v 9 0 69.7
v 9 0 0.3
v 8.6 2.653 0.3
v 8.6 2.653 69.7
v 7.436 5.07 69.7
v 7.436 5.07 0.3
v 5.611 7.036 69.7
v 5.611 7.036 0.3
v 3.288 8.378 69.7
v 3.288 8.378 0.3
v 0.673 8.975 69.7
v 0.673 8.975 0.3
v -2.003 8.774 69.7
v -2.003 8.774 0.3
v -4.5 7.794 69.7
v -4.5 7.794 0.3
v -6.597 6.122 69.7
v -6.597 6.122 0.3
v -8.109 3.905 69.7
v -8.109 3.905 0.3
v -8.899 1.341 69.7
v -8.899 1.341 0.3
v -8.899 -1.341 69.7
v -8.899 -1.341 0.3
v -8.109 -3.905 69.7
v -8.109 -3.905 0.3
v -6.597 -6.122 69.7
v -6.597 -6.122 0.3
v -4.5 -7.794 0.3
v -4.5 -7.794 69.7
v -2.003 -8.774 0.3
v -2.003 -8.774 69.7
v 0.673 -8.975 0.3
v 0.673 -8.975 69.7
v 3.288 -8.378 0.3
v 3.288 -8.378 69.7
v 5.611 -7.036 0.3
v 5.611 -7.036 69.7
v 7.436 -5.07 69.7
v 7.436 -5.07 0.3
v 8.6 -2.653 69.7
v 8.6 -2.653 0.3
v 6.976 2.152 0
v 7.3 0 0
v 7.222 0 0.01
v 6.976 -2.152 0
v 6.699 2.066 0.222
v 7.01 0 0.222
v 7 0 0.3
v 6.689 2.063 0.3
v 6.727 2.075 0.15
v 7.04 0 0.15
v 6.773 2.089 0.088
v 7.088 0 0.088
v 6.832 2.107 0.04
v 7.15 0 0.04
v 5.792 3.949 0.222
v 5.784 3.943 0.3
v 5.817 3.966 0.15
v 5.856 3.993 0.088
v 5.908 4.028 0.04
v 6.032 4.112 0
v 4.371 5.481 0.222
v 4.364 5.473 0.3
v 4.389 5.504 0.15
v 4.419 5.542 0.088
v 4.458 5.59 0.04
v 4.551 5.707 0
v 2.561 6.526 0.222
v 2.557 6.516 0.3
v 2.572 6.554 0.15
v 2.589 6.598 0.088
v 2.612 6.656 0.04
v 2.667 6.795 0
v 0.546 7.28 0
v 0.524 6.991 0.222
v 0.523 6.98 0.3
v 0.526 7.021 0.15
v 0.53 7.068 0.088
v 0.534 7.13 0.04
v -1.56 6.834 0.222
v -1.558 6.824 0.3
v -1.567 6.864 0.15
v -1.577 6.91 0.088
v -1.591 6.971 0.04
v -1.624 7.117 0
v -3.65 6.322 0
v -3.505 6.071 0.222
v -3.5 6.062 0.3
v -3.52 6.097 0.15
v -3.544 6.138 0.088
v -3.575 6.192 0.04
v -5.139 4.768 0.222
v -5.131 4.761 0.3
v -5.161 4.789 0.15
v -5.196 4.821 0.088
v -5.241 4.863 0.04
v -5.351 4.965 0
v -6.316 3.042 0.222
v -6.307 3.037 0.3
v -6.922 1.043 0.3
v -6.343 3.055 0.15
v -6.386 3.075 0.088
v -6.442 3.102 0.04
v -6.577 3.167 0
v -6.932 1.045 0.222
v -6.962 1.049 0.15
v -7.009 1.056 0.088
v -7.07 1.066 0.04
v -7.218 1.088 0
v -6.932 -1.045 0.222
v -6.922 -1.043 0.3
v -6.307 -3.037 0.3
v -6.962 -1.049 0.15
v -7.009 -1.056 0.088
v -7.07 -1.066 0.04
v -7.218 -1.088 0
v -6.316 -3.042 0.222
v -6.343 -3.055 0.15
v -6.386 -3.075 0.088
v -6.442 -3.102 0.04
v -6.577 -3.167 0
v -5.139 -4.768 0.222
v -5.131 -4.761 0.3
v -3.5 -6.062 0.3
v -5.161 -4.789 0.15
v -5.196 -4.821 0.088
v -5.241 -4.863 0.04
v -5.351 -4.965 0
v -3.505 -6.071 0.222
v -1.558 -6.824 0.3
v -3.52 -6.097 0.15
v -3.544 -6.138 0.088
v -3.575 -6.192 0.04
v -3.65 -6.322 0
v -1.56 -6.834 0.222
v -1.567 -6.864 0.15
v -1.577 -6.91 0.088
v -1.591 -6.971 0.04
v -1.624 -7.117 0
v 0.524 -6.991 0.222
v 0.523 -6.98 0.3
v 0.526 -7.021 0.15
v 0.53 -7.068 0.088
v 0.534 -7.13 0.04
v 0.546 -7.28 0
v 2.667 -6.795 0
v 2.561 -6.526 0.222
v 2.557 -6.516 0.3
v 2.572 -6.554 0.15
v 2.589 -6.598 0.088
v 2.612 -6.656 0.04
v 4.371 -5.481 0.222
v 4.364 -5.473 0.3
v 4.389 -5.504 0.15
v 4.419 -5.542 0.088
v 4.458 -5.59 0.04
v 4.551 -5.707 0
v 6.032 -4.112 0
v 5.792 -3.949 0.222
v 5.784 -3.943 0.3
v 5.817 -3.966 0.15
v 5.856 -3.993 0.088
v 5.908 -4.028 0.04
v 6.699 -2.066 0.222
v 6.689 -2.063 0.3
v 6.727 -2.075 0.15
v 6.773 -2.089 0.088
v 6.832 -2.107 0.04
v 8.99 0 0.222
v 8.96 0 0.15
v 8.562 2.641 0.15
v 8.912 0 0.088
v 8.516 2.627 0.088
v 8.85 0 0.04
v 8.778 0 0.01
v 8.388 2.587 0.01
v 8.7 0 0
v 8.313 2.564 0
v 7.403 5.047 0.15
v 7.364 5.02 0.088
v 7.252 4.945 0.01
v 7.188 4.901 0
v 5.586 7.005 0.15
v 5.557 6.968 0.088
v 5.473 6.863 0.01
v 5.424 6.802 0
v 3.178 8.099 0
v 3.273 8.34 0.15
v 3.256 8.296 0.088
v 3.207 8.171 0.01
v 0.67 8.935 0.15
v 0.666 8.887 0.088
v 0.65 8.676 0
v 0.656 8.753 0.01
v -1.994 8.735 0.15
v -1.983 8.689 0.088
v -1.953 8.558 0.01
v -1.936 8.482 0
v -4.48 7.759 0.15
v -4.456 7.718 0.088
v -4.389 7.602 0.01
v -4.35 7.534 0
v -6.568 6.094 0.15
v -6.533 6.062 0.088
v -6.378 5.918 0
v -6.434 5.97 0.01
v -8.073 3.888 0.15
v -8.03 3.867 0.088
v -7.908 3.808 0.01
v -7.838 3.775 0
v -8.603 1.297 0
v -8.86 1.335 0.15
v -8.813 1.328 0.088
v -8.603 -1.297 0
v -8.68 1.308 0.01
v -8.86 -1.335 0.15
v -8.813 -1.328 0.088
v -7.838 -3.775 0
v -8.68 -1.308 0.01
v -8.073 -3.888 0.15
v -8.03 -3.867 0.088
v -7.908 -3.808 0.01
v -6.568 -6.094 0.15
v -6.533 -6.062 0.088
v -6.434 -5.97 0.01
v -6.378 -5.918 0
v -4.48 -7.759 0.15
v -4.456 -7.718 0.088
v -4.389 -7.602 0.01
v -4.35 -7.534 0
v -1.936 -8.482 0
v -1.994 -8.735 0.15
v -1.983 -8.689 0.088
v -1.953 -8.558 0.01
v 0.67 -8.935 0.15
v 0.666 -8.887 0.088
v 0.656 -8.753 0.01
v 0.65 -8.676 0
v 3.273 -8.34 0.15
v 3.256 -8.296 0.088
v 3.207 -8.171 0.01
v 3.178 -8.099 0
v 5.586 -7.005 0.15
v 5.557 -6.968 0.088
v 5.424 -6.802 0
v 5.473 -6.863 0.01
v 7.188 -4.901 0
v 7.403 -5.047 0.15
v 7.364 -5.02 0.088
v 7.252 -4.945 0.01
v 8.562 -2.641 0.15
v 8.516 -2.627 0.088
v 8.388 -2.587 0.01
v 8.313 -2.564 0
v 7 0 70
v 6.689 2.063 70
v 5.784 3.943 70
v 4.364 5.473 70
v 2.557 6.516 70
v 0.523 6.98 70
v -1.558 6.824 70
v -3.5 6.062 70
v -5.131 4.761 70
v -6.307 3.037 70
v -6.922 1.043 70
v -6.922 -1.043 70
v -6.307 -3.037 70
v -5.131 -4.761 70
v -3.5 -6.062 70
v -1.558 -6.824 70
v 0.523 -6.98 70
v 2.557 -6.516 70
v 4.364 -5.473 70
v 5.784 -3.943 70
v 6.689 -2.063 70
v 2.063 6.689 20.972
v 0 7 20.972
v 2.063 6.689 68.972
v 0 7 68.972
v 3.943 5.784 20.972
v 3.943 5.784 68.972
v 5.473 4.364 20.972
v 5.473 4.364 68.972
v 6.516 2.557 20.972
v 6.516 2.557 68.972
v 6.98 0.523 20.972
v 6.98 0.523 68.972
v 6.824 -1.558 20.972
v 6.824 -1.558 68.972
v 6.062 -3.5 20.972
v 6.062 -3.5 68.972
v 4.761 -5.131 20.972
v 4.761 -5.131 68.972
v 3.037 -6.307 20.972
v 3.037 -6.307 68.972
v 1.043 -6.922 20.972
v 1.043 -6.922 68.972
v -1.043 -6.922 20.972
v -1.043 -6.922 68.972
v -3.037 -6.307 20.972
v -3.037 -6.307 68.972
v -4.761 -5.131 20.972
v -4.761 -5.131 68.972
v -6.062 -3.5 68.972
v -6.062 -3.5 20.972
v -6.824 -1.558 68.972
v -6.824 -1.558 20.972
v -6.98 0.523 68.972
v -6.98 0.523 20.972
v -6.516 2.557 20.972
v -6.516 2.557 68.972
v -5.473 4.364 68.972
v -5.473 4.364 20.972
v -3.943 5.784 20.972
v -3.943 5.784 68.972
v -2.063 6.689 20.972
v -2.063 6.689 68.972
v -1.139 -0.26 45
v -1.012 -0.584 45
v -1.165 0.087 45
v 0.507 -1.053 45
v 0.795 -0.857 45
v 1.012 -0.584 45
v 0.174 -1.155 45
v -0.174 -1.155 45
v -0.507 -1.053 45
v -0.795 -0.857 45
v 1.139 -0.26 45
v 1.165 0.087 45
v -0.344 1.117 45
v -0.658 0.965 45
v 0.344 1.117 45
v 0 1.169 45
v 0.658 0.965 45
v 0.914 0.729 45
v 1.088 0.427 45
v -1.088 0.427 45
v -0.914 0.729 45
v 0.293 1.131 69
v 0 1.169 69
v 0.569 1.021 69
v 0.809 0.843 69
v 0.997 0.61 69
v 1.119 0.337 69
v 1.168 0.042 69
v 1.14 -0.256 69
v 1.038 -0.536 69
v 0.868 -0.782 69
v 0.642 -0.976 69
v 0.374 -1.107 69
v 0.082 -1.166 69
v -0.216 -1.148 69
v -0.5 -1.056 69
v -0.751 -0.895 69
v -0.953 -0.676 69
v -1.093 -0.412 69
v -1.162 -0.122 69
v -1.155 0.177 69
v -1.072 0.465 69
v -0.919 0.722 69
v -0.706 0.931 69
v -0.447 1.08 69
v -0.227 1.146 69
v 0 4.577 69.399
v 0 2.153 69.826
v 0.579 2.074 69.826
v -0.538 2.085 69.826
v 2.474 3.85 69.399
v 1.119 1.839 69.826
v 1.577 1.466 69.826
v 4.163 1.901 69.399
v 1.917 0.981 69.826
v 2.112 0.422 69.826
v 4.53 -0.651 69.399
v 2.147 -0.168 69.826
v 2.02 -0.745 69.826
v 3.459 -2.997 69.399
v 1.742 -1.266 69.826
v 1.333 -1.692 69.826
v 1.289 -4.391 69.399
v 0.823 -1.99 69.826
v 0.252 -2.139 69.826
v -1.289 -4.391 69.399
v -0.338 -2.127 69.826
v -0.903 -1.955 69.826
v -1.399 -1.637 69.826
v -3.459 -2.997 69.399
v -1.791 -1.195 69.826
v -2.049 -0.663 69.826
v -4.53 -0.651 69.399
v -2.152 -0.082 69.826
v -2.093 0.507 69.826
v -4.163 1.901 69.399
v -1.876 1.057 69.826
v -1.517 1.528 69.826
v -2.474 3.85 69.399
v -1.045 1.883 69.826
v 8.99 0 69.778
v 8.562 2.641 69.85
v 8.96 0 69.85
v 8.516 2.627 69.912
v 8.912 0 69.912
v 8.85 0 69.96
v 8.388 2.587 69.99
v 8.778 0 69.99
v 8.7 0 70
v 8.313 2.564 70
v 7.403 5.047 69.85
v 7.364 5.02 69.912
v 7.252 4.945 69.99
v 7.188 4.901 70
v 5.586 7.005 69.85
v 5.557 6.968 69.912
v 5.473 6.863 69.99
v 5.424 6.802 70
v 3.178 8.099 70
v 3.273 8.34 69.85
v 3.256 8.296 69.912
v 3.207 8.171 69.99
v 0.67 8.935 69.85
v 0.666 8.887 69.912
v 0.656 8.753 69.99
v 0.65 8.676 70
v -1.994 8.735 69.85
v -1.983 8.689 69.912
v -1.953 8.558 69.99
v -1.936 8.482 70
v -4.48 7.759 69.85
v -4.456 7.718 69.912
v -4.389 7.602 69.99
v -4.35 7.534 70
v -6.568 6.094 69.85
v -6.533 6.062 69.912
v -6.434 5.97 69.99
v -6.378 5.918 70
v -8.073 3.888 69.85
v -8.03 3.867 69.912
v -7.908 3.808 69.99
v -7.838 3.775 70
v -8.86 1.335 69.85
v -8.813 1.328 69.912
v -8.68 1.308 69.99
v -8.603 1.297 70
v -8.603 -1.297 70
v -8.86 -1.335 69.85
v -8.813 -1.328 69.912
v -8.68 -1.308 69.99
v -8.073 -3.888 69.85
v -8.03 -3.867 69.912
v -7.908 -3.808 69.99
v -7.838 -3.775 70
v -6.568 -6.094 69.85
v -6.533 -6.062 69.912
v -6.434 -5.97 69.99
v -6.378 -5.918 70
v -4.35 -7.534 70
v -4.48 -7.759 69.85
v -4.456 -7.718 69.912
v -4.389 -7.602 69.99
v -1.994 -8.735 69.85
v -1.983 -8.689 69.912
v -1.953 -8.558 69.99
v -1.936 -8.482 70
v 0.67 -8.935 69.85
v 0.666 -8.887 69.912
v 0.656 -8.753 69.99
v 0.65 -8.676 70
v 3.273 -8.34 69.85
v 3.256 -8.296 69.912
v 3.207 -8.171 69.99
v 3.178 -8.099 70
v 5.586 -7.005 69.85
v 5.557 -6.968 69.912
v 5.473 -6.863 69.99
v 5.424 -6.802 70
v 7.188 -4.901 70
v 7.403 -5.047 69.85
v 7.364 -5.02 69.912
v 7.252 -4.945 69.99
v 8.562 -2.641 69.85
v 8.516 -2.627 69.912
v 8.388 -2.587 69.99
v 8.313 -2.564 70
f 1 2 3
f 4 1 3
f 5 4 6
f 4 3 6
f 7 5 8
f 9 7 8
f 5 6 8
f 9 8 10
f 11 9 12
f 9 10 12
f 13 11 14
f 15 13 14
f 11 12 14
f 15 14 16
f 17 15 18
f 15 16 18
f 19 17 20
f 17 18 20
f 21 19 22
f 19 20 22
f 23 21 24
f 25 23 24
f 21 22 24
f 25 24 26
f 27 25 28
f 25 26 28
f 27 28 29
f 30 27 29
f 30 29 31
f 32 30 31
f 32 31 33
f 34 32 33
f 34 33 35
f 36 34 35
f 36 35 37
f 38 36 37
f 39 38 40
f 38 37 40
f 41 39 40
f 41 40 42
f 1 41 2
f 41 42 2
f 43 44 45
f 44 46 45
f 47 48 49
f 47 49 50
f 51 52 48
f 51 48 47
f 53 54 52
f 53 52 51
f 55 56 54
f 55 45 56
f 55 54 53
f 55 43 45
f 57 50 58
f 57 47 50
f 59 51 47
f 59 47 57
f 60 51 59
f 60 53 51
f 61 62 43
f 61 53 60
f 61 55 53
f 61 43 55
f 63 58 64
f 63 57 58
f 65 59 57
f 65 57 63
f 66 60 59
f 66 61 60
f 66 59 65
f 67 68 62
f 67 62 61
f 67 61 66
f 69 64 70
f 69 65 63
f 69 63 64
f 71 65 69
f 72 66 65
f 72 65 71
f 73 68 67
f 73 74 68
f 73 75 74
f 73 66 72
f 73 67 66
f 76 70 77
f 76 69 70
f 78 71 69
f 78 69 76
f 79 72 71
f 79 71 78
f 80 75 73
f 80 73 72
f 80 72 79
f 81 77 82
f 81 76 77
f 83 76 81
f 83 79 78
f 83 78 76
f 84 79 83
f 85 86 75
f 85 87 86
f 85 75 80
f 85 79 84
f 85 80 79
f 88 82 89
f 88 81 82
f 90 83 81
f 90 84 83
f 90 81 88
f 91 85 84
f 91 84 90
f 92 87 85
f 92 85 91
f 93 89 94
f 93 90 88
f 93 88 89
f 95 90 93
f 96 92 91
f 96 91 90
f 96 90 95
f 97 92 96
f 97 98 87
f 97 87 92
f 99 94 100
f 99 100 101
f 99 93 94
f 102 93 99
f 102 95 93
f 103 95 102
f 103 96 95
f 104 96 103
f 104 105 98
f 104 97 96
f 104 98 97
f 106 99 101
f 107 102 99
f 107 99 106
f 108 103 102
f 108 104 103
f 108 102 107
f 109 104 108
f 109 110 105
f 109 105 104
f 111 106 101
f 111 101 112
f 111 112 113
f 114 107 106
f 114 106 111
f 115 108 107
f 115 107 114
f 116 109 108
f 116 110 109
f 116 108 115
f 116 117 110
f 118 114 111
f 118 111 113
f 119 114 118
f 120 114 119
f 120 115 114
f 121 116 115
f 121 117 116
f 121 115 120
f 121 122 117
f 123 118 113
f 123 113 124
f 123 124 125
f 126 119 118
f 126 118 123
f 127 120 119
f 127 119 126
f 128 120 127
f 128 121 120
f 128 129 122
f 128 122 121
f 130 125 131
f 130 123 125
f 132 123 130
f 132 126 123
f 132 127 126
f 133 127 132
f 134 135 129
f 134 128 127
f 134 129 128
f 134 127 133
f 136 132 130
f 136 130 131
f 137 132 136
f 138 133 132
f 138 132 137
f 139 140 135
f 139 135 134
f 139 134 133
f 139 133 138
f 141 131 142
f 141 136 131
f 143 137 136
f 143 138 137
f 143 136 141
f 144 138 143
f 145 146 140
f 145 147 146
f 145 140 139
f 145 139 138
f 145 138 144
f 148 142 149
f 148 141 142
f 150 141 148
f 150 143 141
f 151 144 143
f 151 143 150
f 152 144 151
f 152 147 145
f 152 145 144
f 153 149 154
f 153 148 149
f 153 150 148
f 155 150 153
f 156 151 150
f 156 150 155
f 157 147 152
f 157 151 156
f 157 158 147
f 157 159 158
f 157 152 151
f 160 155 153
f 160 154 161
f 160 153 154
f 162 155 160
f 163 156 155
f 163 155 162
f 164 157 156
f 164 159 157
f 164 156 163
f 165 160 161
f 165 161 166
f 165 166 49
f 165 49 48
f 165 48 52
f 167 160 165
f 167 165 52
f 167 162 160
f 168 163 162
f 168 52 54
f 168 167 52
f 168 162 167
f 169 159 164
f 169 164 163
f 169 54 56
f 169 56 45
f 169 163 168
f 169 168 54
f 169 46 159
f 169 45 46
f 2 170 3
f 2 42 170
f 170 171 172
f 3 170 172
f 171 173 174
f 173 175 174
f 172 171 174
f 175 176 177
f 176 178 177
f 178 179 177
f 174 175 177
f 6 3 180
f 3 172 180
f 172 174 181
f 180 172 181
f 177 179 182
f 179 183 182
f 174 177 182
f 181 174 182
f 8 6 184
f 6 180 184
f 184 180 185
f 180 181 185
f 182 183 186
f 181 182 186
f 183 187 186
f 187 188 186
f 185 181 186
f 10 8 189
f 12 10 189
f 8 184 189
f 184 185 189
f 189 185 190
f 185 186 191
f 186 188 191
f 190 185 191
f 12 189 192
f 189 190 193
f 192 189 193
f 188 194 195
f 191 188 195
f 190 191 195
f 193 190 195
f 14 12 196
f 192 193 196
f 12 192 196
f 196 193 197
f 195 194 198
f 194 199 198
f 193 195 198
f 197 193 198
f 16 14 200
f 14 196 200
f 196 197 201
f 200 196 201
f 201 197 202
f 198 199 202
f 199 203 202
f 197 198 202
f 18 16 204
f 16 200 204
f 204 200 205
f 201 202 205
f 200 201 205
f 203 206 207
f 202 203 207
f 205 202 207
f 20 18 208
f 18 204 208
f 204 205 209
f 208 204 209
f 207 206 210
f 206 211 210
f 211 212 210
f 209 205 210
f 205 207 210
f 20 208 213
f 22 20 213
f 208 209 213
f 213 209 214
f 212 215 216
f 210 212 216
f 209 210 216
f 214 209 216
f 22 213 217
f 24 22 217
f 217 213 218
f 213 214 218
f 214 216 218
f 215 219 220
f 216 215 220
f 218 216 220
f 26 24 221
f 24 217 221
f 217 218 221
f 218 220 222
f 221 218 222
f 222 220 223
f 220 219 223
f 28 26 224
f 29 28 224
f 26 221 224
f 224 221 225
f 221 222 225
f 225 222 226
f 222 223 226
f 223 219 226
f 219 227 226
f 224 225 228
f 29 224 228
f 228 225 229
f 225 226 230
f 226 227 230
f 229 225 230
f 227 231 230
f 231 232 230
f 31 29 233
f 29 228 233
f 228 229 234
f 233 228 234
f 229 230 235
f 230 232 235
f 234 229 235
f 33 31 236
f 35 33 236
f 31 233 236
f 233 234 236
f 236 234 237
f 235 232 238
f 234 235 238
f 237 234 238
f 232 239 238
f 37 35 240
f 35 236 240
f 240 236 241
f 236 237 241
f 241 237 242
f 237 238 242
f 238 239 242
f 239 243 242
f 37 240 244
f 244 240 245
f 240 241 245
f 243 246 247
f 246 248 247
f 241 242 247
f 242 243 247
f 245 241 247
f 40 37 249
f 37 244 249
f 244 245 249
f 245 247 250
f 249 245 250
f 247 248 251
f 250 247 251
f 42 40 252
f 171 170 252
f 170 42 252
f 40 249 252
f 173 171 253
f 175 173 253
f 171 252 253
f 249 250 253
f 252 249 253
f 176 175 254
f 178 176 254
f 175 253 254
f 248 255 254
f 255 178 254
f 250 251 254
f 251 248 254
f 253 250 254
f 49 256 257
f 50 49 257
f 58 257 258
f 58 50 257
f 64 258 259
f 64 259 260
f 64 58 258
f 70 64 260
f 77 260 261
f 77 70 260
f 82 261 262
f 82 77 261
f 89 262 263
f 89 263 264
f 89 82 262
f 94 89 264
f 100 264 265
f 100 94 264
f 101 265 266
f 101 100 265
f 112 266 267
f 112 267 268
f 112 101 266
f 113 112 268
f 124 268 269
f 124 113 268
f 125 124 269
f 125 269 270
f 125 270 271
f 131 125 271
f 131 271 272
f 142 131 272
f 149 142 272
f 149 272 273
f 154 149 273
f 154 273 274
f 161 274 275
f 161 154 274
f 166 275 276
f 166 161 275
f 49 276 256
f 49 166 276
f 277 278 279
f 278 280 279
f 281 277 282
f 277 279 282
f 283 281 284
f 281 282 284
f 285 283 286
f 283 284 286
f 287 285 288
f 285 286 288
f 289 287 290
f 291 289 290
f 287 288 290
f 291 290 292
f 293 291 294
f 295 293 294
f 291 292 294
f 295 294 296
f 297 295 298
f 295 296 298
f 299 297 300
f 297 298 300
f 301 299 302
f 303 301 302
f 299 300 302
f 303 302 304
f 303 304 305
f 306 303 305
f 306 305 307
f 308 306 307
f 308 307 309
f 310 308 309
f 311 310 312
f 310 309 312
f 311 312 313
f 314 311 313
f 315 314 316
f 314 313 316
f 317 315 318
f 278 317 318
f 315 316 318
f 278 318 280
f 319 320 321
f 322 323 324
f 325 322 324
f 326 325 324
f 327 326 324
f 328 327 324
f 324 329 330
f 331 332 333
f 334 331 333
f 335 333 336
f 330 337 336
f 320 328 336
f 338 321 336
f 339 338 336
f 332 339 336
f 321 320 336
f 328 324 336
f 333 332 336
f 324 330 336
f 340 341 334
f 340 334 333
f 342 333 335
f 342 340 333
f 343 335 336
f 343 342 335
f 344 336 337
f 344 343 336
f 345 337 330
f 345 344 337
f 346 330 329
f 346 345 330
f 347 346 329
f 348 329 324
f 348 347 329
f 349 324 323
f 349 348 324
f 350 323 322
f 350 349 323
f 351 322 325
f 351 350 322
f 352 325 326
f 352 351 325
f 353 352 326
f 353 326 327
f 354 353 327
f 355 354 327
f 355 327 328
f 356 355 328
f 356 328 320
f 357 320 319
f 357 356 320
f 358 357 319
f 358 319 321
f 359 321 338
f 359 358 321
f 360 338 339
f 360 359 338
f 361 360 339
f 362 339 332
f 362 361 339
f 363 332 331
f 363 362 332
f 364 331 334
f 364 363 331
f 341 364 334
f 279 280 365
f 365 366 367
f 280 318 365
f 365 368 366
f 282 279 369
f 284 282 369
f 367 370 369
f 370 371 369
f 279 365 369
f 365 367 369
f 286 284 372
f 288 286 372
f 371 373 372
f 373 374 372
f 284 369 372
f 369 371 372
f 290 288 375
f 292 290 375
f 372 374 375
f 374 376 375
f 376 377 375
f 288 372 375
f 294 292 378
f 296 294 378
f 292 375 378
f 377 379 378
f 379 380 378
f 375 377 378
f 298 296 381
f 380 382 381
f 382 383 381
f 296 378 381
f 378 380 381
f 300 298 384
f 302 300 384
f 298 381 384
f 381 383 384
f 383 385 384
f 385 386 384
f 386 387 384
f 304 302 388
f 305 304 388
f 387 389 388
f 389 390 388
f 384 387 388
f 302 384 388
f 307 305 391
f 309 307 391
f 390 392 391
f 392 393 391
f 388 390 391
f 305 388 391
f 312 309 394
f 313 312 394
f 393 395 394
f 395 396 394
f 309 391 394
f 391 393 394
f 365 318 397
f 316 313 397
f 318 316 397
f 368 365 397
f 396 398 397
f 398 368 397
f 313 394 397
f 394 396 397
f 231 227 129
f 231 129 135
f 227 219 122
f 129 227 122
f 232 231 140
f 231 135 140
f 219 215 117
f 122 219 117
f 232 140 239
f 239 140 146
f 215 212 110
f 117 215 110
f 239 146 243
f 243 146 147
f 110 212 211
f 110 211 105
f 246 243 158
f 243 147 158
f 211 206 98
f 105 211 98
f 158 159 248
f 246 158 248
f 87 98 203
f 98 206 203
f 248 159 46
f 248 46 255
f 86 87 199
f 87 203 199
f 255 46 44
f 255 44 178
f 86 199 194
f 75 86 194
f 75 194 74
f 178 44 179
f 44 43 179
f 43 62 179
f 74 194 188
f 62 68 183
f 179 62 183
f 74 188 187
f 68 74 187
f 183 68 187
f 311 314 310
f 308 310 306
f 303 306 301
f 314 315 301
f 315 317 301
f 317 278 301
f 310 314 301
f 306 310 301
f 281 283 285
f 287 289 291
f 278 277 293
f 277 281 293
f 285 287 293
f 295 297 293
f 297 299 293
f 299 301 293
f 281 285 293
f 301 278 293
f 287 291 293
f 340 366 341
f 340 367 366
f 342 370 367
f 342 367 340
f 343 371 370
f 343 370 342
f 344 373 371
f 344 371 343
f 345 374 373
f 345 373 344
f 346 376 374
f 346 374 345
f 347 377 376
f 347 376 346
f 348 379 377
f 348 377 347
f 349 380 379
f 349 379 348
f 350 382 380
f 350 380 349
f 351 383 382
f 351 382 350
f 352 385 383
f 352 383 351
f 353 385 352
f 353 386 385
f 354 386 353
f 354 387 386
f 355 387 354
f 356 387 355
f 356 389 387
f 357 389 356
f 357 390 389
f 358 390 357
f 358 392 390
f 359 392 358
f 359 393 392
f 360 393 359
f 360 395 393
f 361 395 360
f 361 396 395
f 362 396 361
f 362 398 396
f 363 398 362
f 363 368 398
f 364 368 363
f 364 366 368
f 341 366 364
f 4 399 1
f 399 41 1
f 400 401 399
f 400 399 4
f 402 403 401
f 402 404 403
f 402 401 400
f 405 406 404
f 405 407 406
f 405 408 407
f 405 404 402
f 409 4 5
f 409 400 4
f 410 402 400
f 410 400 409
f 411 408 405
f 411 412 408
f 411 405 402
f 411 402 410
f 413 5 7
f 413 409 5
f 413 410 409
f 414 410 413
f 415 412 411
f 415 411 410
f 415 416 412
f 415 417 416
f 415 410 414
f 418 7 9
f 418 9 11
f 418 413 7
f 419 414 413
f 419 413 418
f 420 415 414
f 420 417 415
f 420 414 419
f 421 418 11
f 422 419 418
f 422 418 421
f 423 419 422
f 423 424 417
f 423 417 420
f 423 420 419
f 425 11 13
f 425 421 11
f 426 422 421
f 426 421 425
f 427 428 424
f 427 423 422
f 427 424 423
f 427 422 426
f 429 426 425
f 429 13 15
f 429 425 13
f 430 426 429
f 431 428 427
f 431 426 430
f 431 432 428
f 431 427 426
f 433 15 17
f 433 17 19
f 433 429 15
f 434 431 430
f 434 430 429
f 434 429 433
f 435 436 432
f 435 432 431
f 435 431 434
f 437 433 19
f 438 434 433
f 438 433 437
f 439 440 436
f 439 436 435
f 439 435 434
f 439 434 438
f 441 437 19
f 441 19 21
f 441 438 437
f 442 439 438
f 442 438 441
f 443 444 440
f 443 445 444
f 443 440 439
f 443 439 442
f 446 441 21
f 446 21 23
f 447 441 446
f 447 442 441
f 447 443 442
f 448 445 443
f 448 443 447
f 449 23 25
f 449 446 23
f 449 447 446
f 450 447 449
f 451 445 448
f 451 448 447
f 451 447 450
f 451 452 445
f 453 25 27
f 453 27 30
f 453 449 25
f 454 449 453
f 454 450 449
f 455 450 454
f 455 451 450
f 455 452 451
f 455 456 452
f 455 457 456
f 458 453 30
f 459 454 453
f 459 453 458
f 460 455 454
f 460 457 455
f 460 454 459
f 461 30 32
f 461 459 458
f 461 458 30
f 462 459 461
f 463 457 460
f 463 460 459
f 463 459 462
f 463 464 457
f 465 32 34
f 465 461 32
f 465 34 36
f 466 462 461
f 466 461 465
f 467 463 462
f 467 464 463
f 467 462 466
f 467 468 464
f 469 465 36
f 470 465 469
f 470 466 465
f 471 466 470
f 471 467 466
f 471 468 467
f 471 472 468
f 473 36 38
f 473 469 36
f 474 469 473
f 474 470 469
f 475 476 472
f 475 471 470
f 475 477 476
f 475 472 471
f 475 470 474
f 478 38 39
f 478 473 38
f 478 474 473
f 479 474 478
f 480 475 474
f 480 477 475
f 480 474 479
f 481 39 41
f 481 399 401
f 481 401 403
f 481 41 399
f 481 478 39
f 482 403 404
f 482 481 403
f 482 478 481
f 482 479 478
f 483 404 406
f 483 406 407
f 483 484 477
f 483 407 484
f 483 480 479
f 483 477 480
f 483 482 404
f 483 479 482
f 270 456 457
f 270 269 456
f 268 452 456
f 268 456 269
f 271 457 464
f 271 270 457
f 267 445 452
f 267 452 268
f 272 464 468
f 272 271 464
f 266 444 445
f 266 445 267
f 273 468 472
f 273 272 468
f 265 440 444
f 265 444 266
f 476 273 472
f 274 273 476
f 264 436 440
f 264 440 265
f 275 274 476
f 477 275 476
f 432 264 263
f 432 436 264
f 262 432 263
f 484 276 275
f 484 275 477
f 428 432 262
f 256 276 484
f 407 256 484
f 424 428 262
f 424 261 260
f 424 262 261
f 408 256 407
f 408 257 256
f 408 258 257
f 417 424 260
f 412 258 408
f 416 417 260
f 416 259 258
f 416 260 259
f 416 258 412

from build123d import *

# Parameters (mm, degrees)
F0_R     = 9
F0_R_2   = 7
F1_DEPTH = 70
F4_DEPTH = 25
F5_SIZE  = 1
F6_R     = 0.3


with BuildPart() as f1:
    # F0 (on Top) → F1 (new body)
    with BuildSketch(Plane.XY):
        Circle(F0_R)
        Circle(F0_R_2, mode=Mode.SUBTRACT)
    extrude(amount=F1_DEPTH)

    # F6
    f6_edges = [f1.edges().sort_by_distance(p)[0] for p in [
        (-9, 0, 70),
        (-9, 0, 0),
        (-7, 0, 0),
    ]]
    fillet(f6_edges, radius=F6_R)


with BuildPart() as f3:
    # F2 (on Right) → F3 (revolve)
    with BuildSketch(Plane.YZ):
        Polygon((7, 20.9717558716), (7, 68.9717558716), (1.1685377685, 70), (0, 70), (0, 20.9717558716), align=None)
    revolve(axis=Axis((0, 0, 45.4858779358), (0, 0, -1)))

    # F4 (cut): a face of the model
    f4_faces = [f3.faces().sort_by_distance(p)[0] for p in [
        (0, 0, 70),
    ]]
    extrude(f4_faces, amount=-F4_DEPTH, mode=Mode.SUBTRACT)

    # F5
    f5_edges = [f3.edges().sort_by_distance(p)[0] for p in [
        (0, -1.168538, 70),
    ]]
    chamfer(f5_edges, length=F5_SIZE)


solid = Compound([f1.part, f3.part])
